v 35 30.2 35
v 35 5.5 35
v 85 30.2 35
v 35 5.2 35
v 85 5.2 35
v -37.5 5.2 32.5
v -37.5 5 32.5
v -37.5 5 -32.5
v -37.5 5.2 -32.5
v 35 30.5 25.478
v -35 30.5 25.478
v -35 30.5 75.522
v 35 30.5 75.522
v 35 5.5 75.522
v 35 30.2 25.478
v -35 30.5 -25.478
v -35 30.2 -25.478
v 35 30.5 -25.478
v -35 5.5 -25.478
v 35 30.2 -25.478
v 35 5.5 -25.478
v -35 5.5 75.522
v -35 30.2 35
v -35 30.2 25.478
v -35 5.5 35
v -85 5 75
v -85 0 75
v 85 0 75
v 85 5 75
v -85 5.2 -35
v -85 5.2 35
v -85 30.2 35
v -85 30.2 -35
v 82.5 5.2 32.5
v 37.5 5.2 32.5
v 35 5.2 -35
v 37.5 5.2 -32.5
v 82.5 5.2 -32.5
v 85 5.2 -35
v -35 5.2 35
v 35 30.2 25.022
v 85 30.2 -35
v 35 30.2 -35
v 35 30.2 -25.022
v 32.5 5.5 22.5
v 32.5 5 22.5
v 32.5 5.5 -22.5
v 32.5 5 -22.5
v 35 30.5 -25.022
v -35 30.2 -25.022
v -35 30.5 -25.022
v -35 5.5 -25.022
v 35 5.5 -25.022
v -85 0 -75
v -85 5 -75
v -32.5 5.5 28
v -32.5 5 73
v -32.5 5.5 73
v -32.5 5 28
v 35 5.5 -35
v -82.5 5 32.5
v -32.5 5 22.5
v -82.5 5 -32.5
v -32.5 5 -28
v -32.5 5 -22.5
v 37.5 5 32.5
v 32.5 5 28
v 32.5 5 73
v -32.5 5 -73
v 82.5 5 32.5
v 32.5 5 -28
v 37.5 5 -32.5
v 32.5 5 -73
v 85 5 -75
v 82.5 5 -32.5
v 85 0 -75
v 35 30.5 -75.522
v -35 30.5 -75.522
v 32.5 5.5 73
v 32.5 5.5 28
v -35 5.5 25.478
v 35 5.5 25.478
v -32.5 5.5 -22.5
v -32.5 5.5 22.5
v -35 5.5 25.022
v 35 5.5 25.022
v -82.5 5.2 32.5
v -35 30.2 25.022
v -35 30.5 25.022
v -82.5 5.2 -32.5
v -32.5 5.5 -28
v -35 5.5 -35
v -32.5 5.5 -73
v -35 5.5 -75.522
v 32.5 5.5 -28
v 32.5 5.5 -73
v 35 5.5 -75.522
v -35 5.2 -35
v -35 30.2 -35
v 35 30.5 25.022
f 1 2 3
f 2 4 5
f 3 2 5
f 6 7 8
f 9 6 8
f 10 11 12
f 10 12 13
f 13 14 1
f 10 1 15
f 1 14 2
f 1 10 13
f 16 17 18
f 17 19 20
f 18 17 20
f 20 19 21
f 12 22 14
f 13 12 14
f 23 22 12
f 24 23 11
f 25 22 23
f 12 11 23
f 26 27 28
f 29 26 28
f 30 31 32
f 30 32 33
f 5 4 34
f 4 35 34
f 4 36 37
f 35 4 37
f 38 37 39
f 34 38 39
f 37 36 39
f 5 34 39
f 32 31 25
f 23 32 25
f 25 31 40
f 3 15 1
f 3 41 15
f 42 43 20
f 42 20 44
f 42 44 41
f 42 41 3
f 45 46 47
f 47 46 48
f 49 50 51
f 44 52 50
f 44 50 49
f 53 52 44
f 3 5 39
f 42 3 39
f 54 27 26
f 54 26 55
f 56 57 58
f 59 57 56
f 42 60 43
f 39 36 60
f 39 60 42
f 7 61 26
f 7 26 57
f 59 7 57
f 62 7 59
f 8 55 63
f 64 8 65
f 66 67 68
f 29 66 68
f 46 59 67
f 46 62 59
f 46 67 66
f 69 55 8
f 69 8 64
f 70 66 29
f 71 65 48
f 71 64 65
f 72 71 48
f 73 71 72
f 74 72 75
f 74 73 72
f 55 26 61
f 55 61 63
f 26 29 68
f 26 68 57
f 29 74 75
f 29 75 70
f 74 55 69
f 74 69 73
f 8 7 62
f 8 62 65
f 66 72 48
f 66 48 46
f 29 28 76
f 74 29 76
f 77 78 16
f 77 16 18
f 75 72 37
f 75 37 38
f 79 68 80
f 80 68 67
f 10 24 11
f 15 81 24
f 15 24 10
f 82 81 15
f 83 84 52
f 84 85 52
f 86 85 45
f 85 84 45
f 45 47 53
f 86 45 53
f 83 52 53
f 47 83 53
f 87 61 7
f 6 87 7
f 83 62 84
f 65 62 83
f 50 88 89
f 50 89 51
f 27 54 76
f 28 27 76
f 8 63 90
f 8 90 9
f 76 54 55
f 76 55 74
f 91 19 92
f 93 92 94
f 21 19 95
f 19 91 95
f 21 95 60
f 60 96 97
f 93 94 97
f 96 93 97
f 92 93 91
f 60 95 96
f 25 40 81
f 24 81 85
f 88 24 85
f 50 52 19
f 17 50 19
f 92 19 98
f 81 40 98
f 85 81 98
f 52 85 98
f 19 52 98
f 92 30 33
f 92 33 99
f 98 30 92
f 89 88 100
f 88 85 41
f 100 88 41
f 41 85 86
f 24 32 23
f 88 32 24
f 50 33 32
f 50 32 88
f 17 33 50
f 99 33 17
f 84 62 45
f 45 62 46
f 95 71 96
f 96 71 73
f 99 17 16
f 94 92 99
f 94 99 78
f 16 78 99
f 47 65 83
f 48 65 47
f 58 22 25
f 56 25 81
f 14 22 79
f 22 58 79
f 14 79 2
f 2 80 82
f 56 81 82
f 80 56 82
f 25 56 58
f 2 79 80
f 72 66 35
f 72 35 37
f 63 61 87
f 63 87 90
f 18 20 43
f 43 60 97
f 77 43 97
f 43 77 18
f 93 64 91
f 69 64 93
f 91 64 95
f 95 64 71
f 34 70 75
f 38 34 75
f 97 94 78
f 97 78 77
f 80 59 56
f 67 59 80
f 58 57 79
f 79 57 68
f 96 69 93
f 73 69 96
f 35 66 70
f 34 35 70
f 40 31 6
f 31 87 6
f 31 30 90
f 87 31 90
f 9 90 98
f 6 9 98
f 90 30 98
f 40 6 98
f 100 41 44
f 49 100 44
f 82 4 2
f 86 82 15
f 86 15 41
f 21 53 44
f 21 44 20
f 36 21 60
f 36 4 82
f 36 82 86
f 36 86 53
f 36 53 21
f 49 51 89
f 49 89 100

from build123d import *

# Parameters (mm, degrees)
SKETCH1_W           = 170
SKETCH1_H           = 150
BOSS_EXTRUDE1_DEPTH = 5
SKETCH4_W           = 65
SKETCH4_H           = 45
BOSS_EXTRUDE2_DEPTH = 0.5
SKETCH5_W           = 70
SKETCH5_H           = 50.044144688
BOSS_EXTRUDE3_DEPTH = 25
LPATTERN3_COUNT     = 2
LPATTERN3_PITCH     = 50.5
LPATTERN3_COL_COUNT = 2
LPATTERN3_COL_PITCH = 50.5
SKETCH6_W           = 45
SKETCH6_H           = 65
BOSS_EXTRUDE4_DEPTH = 0.2
SKETCH7_W           = 50
SKETCH7_H           = 70
BOSS_EXTRUDE5_DEPTH = 25
LPATTERN4_COUNT     = 2
LPATTERN4_PITCH     = 120


with BuildPart() as part:
    # Sketch1 → Boss-Extrude1 (new body)
    with BuildSketch(Plane(origin=(0, 0, 0), x_dir=(1, 0, 0), z_dir=(0, 1, 0))):
        Rectangle(SKETCH1_W, SKETCH1_H)
    extrude(amount=BOSS_EXTRUDE1_DEPTH)

    # Sketch4 → Boss-Extrude2 (add)
    with BuildSketch(Plane(origin=(0, 5, 0), x_dir=(1, 0, 0), z_dir=(0, 1, 0))):
        Rectangle(SKETCH4_W, SKETCH4_H)
    boss_extrude2 = extrude(amount=BOSS_EXTRUDE2_DEPTH)

    # Sketch5 → Boss-Extrude3 (add)
    with BuildSketch(Plane(origin=(0, 5.5, 0), x_dir=(1, 0, 0), z_dir=(0, 1, 0))):
        Rectangle(SKETCH5_W, SKETCH5_H)
    boss_extrude3 = extrude(amount=BOSS_EXTRUDE3_DEPTH)

    # LPattern3: Boss-Extrude2, Boss-Extrude3 ×2
    with Locations(*[(0, 0, i * LPATTERN3_PITCH) for i in range(1, LPATTERN3_COUNT)]):
        add(boss_extrude2)
        add(boss_extrude3)

    # LPattern3 col: Boss-Extrude2, Boss-Extrude3 ×2
    with Locations(*[(0, 0, -i * LPATTERN3_COL_PITCH) for i in range(1, LPATTERN3_COL_COUNT)]):
        add(boss_extrude2)
        add(boss_extrude3)

    # Sketch6 → Boss-Extrude4 (add)
    with BuildSketch(Plane(origin=(0, 5, 0), x_dir=(1, 0, 0), z_dir=(0, 1, 0))):
        with Locations((60, 0)):
            Rectangle(SKETCH6_W, SKETCH6_H)
    boss_extrude4 = extrude(amount=BOSS_EXTRUDE4_DEPTH)

    # Sketch7 → Boss-Extrude5 (add)
    with BuildSketch(Plane(origin=(0, 5.2, 0), x_dir=(1, 0, 0), z_dir=(0, 1, 0))):
        with Locations((60, 0)):
            Rectangle(SKETCH7_W, SKETCH7_H)
    boss_extrude5 = extrude(amount=BOSS_EXTRUDE5_DEPTH)

    # LPattern4: Boss-Extrude4, Boss-Extrude5 ×2
    with Locations(*[(-i * LPATTERN4_PITCH, 0, 0) for i in range(1, LPATTERN4_COUNT)]):
        add(boss_extrude4)
        add(boss_extrude5)


solid = part.part
